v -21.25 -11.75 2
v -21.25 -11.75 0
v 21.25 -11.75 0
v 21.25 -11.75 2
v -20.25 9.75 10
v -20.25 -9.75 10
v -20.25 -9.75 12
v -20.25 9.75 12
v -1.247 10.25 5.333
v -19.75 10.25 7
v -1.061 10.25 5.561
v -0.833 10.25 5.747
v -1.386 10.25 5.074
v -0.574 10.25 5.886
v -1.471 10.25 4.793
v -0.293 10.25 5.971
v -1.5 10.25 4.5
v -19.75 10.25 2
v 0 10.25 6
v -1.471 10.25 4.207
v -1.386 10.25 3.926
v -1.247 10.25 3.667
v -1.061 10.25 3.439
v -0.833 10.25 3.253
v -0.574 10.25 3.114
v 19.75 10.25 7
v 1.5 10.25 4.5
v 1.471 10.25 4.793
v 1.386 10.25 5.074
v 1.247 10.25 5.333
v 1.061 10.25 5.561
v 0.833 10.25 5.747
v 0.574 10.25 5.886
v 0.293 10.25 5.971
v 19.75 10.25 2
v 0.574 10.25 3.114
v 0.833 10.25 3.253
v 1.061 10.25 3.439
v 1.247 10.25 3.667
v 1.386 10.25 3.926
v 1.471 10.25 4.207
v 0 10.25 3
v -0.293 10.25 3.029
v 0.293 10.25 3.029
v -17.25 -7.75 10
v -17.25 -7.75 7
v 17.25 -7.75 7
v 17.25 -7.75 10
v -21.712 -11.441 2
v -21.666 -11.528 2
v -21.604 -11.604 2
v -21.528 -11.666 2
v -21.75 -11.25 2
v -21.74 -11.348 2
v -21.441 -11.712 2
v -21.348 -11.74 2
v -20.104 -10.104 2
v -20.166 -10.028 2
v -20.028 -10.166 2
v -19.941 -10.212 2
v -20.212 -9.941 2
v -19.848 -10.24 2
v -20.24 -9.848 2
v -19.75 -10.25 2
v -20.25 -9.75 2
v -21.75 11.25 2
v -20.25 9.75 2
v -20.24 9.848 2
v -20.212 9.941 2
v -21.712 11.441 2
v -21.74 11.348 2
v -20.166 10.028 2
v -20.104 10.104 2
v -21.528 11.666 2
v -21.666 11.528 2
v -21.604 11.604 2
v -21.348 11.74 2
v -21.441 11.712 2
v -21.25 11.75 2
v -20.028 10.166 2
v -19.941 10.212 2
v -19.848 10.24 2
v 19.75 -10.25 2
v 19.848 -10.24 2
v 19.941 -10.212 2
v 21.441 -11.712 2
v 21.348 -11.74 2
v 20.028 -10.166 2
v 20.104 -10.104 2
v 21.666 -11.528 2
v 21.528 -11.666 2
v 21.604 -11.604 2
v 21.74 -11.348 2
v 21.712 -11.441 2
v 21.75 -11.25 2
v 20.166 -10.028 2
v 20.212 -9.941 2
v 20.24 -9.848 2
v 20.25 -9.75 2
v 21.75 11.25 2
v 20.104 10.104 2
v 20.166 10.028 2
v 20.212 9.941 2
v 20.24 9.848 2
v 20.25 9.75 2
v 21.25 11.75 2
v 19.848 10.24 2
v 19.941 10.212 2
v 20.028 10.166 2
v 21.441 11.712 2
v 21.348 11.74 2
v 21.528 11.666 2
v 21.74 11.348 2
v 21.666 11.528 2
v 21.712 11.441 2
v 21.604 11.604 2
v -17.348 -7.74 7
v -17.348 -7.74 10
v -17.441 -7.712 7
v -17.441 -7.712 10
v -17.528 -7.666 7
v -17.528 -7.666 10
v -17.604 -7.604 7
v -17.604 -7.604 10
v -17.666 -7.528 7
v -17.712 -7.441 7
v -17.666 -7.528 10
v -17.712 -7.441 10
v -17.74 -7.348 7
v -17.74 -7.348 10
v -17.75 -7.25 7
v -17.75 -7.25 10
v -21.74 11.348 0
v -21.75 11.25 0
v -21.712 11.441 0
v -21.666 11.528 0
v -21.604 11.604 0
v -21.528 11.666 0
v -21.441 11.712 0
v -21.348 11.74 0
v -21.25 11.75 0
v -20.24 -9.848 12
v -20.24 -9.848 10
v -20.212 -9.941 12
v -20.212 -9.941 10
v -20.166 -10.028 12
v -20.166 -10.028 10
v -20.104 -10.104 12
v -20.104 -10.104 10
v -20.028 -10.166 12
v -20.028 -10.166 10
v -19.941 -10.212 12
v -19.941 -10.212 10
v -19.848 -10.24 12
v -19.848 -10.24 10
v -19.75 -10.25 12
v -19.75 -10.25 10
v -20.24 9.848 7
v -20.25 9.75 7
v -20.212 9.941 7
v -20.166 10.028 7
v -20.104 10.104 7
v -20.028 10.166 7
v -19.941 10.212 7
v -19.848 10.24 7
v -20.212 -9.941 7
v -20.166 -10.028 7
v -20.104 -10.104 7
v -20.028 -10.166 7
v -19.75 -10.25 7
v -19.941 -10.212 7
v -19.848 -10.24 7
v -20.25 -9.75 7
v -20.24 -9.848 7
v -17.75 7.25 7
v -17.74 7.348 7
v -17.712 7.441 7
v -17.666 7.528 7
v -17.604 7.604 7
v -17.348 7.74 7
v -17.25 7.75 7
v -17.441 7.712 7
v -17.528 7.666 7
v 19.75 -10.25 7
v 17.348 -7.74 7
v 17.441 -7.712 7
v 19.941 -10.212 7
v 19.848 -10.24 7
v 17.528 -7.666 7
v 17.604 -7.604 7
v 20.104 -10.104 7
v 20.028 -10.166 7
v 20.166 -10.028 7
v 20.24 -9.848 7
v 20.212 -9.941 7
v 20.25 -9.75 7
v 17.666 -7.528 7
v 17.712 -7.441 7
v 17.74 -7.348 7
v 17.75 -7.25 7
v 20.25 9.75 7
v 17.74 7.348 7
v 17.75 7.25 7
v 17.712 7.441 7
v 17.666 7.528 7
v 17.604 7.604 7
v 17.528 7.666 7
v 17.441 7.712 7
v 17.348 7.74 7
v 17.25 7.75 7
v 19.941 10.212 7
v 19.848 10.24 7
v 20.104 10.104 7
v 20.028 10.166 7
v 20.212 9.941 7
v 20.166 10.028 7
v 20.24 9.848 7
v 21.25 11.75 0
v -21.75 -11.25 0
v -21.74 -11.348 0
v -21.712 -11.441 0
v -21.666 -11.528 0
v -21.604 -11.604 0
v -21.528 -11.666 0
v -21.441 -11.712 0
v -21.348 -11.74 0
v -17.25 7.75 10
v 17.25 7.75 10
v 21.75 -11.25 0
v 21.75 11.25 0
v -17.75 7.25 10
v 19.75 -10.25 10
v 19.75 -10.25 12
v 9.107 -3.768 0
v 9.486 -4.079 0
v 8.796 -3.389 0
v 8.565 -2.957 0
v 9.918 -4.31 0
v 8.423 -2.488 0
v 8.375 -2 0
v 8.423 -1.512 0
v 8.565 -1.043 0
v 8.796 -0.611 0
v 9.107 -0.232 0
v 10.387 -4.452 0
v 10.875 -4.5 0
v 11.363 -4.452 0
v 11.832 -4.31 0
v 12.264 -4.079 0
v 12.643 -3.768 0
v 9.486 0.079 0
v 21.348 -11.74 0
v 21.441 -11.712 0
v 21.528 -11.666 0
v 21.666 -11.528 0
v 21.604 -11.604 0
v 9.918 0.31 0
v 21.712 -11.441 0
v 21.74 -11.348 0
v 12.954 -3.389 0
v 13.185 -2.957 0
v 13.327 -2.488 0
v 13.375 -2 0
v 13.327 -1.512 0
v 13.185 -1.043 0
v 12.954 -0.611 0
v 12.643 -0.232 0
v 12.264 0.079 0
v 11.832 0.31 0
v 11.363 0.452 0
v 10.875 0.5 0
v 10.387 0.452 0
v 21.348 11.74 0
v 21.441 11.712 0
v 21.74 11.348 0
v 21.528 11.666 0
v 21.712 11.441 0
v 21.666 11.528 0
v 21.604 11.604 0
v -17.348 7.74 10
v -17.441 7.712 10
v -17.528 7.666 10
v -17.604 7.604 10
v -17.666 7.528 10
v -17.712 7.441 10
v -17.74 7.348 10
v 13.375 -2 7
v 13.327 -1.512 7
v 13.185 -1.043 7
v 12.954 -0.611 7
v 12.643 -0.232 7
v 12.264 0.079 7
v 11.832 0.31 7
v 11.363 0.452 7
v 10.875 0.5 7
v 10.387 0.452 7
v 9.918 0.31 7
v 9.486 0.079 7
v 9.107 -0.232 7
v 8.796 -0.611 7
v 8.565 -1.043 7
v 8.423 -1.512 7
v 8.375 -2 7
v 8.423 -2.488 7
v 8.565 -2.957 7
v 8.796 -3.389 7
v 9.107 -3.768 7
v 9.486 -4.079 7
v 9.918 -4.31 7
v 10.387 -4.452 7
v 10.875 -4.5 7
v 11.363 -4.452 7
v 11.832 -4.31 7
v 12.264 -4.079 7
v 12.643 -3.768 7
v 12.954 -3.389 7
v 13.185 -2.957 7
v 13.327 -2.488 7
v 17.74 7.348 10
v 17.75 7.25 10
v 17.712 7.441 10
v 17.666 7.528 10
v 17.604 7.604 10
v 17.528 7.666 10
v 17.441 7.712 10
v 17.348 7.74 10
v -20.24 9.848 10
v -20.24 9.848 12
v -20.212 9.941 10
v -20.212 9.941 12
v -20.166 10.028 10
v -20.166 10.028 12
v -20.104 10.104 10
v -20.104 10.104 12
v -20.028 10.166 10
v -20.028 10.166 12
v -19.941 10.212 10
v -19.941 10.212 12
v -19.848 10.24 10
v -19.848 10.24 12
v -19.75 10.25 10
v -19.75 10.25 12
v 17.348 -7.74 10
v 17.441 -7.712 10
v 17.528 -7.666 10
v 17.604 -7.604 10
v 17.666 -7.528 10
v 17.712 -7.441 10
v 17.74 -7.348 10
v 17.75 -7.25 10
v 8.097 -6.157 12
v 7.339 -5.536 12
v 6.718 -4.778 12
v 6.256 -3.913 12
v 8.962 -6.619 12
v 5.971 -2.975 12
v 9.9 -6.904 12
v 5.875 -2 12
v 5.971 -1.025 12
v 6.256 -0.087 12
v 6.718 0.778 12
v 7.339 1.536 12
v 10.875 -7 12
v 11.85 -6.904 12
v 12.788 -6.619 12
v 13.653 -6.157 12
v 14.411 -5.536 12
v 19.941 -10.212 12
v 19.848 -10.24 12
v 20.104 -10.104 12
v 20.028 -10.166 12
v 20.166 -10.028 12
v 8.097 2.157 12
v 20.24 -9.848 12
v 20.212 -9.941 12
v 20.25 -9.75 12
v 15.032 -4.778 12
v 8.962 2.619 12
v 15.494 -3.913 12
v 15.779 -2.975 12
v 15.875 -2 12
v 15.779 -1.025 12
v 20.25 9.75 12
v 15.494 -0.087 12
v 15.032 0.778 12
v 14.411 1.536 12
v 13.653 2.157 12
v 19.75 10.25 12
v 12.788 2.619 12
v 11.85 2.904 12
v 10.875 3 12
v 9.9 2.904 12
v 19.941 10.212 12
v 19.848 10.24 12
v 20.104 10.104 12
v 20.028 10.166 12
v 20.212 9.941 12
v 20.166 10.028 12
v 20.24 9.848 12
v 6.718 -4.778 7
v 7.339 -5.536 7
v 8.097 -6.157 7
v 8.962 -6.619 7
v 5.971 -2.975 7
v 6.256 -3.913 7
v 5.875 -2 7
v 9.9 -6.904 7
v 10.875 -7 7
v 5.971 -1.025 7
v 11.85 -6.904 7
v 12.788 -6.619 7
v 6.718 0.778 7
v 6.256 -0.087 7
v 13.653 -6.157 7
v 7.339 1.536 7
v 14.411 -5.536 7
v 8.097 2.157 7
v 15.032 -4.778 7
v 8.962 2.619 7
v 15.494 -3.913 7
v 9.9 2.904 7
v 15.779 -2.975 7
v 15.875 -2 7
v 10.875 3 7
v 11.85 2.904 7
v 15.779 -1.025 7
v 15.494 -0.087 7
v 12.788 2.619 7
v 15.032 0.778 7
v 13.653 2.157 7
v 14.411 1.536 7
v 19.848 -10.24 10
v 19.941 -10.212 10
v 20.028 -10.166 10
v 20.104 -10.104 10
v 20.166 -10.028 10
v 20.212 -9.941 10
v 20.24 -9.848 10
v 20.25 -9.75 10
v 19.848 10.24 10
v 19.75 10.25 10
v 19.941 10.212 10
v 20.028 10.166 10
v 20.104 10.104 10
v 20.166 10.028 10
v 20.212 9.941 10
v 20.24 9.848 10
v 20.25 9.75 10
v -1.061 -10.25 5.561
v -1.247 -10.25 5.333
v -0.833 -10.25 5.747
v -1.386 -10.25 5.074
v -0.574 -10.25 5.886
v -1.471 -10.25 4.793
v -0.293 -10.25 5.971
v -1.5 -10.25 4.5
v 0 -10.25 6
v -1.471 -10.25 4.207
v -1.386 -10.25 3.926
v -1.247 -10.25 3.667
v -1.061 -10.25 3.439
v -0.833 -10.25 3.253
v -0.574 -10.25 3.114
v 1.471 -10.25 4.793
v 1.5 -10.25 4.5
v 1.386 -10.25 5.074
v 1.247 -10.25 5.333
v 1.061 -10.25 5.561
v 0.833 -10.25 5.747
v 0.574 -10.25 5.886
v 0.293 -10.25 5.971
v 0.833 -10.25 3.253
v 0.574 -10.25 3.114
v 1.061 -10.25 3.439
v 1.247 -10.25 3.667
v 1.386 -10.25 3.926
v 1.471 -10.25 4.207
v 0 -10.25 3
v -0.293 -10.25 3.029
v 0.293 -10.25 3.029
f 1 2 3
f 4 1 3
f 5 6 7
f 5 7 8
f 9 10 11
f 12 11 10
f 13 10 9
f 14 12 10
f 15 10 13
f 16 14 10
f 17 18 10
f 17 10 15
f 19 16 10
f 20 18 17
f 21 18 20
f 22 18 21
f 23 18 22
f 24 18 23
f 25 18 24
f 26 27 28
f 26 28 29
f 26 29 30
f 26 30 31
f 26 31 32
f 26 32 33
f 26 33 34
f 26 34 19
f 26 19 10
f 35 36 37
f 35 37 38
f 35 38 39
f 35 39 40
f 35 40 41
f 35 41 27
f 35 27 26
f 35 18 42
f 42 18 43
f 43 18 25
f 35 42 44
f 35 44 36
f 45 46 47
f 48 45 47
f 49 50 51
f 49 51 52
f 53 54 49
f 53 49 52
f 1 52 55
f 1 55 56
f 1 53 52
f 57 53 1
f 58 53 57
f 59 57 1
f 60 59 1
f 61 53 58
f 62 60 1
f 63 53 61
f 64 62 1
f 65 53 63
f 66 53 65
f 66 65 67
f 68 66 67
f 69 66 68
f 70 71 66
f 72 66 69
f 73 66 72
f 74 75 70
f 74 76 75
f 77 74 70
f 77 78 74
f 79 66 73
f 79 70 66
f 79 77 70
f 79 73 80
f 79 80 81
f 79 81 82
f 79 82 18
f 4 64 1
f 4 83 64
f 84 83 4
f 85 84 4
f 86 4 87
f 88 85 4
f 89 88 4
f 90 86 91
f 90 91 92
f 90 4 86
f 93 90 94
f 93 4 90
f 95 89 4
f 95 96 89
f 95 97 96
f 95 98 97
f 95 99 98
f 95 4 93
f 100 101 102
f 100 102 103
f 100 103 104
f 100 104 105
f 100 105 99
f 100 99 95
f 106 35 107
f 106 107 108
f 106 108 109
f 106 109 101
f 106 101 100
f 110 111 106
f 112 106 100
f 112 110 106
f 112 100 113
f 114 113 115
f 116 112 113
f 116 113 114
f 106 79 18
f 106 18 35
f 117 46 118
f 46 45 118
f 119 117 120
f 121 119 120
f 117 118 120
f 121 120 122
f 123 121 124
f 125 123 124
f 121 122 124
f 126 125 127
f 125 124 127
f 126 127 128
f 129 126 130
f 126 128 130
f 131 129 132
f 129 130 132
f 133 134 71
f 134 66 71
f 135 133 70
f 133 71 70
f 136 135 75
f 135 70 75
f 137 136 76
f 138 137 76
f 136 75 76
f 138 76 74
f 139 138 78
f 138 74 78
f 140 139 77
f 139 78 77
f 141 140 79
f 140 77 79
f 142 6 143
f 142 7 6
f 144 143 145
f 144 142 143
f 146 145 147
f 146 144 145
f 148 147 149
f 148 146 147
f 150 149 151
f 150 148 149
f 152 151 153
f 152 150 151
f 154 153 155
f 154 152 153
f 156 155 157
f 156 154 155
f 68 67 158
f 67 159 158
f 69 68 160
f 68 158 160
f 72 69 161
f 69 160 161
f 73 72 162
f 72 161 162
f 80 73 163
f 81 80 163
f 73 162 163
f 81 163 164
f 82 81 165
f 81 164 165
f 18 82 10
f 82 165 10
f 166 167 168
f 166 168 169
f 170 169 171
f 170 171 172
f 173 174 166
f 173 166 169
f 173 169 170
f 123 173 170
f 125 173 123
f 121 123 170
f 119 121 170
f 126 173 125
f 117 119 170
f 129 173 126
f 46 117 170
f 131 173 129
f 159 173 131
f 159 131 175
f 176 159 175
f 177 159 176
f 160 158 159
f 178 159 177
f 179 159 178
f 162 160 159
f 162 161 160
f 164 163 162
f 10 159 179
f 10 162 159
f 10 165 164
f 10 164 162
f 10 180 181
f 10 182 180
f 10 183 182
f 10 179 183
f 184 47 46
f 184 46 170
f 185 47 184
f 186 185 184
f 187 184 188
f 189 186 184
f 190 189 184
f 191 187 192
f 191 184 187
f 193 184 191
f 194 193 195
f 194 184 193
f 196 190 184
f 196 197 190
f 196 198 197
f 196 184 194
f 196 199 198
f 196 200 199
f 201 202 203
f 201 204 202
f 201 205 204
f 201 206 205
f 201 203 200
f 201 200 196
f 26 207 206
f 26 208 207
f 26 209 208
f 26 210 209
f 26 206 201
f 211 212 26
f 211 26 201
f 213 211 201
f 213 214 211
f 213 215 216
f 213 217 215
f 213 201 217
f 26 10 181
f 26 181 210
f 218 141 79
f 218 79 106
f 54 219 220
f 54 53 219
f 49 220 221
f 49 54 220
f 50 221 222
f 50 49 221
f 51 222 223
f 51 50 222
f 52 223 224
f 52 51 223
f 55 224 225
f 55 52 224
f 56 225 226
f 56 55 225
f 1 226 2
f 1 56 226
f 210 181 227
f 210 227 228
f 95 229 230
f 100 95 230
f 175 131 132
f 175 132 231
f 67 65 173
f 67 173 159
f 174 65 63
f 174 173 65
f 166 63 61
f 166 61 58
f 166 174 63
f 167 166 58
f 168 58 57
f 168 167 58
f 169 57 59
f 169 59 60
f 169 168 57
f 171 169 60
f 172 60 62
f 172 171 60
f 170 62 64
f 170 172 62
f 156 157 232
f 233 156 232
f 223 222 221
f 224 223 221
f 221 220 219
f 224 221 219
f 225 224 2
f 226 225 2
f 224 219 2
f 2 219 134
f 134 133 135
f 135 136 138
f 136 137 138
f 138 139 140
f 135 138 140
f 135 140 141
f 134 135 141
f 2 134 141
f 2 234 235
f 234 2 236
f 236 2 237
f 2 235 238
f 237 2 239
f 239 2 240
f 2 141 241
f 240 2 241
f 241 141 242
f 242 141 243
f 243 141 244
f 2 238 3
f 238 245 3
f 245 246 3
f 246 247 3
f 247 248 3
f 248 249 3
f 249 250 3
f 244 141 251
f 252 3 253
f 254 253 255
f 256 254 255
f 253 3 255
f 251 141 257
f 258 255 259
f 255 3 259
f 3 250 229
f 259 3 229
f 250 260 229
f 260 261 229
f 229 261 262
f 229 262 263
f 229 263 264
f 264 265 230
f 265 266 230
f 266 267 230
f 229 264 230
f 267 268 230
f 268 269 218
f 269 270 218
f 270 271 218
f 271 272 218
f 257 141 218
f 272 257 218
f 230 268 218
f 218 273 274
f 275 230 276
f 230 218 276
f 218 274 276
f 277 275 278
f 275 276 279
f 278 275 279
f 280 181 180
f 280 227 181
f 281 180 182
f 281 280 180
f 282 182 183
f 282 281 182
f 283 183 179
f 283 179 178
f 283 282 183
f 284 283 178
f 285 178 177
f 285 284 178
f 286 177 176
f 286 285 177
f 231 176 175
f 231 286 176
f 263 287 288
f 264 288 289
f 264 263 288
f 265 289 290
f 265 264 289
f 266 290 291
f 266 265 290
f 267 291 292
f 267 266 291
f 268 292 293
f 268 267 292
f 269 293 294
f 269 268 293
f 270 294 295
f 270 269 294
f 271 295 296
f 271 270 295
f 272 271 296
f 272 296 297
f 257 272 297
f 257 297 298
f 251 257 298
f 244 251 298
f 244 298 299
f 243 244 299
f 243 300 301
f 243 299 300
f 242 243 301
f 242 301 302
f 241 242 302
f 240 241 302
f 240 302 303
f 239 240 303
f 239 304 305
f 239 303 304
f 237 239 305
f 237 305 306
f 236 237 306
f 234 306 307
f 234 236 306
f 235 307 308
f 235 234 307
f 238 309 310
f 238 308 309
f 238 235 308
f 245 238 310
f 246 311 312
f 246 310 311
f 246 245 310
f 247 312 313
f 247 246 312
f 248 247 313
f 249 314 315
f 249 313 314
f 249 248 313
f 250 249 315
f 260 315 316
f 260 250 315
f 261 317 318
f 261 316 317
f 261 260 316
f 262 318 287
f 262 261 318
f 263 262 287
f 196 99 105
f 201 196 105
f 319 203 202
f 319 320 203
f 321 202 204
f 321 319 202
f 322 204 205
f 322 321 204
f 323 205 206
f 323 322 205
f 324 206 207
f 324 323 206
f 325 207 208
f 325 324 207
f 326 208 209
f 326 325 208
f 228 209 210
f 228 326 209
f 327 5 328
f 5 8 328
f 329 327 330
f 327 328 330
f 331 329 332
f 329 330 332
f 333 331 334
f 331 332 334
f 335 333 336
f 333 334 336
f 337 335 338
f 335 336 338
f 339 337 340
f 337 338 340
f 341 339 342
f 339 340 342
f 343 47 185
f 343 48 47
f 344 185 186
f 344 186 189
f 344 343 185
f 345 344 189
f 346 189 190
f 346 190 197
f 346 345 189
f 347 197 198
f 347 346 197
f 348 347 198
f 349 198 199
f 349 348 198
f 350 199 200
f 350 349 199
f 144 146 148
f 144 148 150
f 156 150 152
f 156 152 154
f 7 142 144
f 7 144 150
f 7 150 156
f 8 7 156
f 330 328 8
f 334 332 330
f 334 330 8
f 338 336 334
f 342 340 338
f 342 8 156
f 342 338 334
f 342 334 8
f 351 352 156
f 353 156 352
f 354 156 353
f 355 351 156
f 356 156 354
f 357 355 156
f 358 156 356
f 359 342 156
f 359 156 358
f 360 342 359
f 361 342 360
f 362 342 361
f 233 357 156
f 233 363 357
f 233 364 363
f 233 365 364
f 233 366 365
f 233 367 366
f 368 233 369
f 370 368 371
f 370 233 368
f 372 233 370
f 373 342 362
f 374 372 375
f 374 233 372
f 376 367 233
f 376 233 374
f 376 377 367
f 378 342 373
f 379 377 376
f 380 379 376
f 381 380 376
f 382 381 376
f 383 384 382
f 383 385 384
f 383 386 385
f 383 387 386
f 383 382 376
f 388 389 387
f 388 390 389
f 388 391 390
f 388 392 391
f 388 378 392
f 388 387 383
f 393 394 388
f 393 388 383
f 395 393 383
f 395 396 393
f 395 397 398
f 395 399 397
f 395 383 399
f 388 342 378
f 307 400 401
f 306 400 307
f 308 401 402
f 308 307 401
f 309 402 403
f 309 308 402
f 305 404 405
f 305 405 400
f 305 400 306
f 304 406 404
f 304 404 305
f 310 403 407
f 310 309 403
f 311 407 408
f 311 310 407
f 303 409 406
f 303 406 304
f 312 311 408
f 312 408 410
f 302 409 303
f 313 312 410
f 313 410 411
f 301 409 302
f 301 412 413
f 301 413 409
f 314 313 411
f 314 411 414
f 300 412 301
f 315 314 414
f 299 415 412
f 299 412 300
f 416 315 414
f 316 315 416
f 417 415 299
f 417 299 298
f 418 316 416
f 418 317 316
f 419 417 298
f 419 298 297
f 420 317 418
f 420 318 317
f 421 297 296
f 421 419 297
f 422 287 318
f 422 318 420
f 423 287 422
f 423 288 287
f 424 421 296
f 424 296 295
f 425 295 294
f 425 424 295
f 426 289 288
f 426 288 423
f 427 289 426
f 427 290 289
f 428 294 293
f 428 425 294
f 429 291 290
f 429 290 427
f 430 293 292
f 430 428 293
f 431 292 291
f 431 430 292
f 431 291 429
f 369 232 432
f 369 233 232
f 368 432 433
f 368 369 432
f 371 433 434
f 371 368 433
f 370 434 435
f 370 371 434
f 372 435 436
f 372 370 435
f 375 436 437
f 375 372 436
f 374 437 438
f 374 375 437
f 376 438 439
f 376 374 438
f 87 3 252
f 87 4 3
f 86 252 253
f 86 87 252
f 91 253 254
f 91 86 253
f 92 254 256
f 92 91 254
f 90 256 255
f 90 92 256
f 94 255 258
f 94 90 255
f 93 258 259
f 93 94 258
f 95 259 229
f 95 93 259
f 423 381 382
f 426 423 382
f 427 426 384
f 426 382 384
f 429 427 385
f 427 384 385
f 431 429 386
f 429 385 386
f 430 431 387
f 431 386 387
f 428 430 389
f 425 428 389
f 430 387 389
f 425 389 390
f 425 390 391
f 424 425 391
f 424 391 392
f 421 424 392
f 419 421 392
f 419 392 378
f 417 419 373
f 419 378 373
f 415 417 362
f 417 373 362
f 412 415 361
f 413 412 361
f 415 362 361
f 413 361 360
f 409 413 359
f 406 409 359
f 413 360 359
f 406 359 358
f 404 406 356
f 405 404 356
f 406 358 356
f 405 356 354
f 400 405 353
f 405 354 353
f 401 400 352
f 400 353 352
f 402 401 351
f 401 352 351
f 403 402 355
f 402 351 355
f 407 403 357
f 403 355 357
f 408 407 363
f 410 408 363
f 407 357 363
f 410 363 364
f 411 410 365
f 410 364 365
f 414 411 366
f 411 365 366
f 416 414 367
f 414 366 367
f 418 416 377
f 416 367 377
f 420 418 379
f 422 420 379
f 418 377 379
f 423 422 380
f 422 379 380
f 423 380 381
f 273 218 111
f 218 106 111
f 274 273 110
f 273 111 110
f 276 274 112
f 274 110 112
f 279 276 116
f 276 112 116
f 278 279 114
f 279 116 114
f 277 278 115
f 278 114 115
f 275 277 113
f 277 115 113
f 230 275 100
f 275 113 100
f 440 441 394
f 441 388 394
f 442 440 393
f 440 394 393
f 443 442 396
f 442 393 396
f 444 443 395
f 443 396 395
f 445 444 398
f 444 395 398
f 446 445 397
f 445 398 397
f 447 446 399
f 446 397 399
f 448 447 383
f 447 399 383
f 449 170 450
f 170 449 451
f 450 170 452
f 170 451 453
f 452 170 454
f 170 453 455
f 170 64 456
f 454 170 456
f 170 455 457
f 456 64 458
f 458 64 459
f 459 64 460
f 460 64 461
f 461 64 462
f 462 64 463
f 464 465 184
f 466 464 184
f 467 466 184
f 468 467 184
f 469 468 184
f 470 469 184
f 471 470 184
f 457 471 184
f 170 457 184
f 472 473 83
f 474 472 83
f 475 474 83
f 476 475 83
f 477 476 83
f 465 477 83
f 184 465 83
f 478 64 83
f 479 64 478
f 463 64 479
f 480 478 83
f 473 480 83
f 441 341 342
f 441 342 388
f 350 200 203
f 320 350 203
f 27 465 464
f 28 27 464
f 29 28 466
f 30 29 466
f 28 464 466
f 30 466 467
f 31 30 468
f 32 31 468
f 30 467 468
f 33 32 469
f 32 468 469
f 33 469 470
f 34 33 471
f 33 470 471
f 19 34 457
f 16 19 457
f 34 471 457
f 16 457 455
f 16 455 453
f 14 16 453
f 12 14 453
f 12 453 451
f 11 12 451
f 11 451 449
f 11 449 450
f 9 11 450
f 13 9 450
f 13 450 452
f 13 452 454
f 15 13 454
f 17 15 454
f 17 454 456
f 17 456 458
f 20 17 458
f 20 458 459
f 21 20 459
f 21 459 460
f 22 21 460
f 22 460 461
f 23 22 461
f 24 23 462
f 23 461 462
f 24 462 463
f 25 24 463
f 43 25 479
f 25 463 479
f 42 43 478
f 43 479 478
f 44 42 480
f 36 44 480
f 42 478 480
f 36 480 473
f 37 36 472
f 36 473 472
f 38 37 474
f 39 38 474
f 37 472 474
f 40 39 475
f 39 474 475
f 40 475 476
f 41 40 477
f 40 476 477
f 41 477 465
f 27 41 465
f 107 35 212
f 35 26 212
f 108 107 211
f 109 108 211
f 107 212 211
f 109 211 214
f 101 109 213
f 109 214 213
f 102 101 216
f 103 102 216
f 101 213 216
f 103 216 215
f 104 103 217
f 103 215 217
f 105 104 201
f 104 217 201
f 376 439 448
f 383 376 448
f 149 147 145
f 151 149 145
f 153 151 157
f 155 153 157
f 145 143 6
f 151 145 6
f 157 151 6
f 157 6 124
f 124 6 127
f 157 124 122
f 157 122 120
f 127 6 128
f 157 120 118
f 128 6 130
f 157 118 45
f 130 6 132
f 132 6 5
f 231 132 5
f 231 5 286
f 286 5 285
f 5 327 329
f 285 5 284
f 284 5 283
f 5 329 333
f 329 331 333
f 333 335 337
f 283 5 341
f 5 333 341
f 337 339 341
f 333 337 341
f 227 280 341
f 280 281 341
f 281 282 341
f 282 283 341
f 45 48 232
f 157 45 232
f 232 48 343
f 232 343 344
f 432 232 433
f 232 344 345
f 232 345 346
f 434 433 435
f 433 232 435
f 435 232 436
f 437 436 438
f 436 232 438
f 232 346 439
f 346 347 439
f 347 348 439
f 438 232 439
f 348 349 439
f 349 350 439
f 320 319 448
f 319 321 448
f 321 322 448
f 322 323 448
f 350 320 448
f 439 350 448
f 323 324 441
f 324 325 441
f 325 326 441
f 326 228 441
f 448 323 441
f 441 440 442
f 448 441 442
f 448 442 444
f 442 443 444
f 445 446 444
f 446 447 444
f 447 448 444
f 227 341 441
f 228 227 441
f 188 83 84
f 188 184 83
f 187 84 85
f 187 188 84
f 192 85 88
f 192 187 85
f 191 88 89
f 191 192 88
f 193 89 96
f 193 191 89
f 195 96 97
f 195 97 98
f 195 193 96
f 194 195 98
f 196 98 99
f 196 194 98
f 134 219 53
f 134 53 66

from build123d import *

# Parameters (mm, degrees)
F0_W      = 43.5
F0_H      = 23.5
F1_DEPTH  = 2
F2_W      = 40.5
F2_H      = 20.5
F3_DEPTH  = 5
F4_W      = 35.5
F4_H      = 15.5
F5_DEPTH  = 3
F6_W      = 40.5
F6_H      = 20.5
F7_DEPTH  = 2
F8_R      = 0.5
F9_R      = 2.5
F10_DEPTH = 12.001
F11_R     = 5
F12_DEPTH = 5
F13_R     = 1.5
F14_DEPTH = 25


with BuildPart() as f1:
    # F0 (on Top) → F1 (new body)
    with BuildSketch(Plane.XY):
        Rectangle(F0_W, F0_H)
    extrude(amount=F1_DEPTH)

    # F2 (on face) → F3 (join)
    with BuildSketch(Plane.XY.offset(2)):
        Rectangle(F2_W, F2_H)
    extrude(amount=F3_DEPTH)

    # F4 (on face) → F5 (join)
    with BuildSketch(Plane.XY.offset(7)):
        Rectangle(F4_W, F4_H)
    extrude(amount=F5_DEPTH)

    # F6 (on face) → F7 (join)
    with BuildSketch(Plane.XY.offset(10)):
        Rectangle(F6_W, F6_H)
    extrude(amount=F7_DEPTH)

    # F8
    f8_edges = [f1.edges().sort_by_distance(p)[0] for p in [
        (-20.25, 10.25, 4.5),
        (-17.75, 7.75, 8.5),
        (-20.25, 10.25, 11),
        (-20.25, -10.25, 4.5),
        (-17.75, -7.75, 8.5),
        (-20.25, -10.25, 11),
        (20.25, -10.25, 4.5),
        (17.75, -7.75, 8.5),
        (20.25, -10.25, 11),
        (20.25, 10.25, 4.5),
        (17.75, 7.75, 8.5),
        (20.25, 10.25, 11),
        (21.75, -11.75, 1),
        (21.75, 11.75, 1),
        (-21.75, -11.75, 1),
        (-21.75, 11.75, 1),
    ]]
    fillet(f8_edges, radius=F8_R)

    # F9 (on Top) → F10 (cut, through all)
    with BuildSketch(Plane.XY):
        with Locations((10.875, -2)):
            Circle(F9_R)
    extrude(amount=F10_DEPTH, mode=Mode.SUBTRACT)

    # F11 (on face) → F12 (cut, through all)
    with BuildSketch(Plane.XY.offset(12)):
        with Locations((10.875, -2)):
            Circle(F11_R)
    extrude(amount=-F12_DEPTH, mode=Mode.SUBTRACT)

    # F13 (on face) → F14 (cut)
    with BuildSketch(Plane.XZ.offset(10.25)):
        with Locations((0, 4.5)):
            Circle(F13_R)
    extrude(amount=-F14_DEPTH, mode=Mode.SUBTRACT)


solid = f1.part
